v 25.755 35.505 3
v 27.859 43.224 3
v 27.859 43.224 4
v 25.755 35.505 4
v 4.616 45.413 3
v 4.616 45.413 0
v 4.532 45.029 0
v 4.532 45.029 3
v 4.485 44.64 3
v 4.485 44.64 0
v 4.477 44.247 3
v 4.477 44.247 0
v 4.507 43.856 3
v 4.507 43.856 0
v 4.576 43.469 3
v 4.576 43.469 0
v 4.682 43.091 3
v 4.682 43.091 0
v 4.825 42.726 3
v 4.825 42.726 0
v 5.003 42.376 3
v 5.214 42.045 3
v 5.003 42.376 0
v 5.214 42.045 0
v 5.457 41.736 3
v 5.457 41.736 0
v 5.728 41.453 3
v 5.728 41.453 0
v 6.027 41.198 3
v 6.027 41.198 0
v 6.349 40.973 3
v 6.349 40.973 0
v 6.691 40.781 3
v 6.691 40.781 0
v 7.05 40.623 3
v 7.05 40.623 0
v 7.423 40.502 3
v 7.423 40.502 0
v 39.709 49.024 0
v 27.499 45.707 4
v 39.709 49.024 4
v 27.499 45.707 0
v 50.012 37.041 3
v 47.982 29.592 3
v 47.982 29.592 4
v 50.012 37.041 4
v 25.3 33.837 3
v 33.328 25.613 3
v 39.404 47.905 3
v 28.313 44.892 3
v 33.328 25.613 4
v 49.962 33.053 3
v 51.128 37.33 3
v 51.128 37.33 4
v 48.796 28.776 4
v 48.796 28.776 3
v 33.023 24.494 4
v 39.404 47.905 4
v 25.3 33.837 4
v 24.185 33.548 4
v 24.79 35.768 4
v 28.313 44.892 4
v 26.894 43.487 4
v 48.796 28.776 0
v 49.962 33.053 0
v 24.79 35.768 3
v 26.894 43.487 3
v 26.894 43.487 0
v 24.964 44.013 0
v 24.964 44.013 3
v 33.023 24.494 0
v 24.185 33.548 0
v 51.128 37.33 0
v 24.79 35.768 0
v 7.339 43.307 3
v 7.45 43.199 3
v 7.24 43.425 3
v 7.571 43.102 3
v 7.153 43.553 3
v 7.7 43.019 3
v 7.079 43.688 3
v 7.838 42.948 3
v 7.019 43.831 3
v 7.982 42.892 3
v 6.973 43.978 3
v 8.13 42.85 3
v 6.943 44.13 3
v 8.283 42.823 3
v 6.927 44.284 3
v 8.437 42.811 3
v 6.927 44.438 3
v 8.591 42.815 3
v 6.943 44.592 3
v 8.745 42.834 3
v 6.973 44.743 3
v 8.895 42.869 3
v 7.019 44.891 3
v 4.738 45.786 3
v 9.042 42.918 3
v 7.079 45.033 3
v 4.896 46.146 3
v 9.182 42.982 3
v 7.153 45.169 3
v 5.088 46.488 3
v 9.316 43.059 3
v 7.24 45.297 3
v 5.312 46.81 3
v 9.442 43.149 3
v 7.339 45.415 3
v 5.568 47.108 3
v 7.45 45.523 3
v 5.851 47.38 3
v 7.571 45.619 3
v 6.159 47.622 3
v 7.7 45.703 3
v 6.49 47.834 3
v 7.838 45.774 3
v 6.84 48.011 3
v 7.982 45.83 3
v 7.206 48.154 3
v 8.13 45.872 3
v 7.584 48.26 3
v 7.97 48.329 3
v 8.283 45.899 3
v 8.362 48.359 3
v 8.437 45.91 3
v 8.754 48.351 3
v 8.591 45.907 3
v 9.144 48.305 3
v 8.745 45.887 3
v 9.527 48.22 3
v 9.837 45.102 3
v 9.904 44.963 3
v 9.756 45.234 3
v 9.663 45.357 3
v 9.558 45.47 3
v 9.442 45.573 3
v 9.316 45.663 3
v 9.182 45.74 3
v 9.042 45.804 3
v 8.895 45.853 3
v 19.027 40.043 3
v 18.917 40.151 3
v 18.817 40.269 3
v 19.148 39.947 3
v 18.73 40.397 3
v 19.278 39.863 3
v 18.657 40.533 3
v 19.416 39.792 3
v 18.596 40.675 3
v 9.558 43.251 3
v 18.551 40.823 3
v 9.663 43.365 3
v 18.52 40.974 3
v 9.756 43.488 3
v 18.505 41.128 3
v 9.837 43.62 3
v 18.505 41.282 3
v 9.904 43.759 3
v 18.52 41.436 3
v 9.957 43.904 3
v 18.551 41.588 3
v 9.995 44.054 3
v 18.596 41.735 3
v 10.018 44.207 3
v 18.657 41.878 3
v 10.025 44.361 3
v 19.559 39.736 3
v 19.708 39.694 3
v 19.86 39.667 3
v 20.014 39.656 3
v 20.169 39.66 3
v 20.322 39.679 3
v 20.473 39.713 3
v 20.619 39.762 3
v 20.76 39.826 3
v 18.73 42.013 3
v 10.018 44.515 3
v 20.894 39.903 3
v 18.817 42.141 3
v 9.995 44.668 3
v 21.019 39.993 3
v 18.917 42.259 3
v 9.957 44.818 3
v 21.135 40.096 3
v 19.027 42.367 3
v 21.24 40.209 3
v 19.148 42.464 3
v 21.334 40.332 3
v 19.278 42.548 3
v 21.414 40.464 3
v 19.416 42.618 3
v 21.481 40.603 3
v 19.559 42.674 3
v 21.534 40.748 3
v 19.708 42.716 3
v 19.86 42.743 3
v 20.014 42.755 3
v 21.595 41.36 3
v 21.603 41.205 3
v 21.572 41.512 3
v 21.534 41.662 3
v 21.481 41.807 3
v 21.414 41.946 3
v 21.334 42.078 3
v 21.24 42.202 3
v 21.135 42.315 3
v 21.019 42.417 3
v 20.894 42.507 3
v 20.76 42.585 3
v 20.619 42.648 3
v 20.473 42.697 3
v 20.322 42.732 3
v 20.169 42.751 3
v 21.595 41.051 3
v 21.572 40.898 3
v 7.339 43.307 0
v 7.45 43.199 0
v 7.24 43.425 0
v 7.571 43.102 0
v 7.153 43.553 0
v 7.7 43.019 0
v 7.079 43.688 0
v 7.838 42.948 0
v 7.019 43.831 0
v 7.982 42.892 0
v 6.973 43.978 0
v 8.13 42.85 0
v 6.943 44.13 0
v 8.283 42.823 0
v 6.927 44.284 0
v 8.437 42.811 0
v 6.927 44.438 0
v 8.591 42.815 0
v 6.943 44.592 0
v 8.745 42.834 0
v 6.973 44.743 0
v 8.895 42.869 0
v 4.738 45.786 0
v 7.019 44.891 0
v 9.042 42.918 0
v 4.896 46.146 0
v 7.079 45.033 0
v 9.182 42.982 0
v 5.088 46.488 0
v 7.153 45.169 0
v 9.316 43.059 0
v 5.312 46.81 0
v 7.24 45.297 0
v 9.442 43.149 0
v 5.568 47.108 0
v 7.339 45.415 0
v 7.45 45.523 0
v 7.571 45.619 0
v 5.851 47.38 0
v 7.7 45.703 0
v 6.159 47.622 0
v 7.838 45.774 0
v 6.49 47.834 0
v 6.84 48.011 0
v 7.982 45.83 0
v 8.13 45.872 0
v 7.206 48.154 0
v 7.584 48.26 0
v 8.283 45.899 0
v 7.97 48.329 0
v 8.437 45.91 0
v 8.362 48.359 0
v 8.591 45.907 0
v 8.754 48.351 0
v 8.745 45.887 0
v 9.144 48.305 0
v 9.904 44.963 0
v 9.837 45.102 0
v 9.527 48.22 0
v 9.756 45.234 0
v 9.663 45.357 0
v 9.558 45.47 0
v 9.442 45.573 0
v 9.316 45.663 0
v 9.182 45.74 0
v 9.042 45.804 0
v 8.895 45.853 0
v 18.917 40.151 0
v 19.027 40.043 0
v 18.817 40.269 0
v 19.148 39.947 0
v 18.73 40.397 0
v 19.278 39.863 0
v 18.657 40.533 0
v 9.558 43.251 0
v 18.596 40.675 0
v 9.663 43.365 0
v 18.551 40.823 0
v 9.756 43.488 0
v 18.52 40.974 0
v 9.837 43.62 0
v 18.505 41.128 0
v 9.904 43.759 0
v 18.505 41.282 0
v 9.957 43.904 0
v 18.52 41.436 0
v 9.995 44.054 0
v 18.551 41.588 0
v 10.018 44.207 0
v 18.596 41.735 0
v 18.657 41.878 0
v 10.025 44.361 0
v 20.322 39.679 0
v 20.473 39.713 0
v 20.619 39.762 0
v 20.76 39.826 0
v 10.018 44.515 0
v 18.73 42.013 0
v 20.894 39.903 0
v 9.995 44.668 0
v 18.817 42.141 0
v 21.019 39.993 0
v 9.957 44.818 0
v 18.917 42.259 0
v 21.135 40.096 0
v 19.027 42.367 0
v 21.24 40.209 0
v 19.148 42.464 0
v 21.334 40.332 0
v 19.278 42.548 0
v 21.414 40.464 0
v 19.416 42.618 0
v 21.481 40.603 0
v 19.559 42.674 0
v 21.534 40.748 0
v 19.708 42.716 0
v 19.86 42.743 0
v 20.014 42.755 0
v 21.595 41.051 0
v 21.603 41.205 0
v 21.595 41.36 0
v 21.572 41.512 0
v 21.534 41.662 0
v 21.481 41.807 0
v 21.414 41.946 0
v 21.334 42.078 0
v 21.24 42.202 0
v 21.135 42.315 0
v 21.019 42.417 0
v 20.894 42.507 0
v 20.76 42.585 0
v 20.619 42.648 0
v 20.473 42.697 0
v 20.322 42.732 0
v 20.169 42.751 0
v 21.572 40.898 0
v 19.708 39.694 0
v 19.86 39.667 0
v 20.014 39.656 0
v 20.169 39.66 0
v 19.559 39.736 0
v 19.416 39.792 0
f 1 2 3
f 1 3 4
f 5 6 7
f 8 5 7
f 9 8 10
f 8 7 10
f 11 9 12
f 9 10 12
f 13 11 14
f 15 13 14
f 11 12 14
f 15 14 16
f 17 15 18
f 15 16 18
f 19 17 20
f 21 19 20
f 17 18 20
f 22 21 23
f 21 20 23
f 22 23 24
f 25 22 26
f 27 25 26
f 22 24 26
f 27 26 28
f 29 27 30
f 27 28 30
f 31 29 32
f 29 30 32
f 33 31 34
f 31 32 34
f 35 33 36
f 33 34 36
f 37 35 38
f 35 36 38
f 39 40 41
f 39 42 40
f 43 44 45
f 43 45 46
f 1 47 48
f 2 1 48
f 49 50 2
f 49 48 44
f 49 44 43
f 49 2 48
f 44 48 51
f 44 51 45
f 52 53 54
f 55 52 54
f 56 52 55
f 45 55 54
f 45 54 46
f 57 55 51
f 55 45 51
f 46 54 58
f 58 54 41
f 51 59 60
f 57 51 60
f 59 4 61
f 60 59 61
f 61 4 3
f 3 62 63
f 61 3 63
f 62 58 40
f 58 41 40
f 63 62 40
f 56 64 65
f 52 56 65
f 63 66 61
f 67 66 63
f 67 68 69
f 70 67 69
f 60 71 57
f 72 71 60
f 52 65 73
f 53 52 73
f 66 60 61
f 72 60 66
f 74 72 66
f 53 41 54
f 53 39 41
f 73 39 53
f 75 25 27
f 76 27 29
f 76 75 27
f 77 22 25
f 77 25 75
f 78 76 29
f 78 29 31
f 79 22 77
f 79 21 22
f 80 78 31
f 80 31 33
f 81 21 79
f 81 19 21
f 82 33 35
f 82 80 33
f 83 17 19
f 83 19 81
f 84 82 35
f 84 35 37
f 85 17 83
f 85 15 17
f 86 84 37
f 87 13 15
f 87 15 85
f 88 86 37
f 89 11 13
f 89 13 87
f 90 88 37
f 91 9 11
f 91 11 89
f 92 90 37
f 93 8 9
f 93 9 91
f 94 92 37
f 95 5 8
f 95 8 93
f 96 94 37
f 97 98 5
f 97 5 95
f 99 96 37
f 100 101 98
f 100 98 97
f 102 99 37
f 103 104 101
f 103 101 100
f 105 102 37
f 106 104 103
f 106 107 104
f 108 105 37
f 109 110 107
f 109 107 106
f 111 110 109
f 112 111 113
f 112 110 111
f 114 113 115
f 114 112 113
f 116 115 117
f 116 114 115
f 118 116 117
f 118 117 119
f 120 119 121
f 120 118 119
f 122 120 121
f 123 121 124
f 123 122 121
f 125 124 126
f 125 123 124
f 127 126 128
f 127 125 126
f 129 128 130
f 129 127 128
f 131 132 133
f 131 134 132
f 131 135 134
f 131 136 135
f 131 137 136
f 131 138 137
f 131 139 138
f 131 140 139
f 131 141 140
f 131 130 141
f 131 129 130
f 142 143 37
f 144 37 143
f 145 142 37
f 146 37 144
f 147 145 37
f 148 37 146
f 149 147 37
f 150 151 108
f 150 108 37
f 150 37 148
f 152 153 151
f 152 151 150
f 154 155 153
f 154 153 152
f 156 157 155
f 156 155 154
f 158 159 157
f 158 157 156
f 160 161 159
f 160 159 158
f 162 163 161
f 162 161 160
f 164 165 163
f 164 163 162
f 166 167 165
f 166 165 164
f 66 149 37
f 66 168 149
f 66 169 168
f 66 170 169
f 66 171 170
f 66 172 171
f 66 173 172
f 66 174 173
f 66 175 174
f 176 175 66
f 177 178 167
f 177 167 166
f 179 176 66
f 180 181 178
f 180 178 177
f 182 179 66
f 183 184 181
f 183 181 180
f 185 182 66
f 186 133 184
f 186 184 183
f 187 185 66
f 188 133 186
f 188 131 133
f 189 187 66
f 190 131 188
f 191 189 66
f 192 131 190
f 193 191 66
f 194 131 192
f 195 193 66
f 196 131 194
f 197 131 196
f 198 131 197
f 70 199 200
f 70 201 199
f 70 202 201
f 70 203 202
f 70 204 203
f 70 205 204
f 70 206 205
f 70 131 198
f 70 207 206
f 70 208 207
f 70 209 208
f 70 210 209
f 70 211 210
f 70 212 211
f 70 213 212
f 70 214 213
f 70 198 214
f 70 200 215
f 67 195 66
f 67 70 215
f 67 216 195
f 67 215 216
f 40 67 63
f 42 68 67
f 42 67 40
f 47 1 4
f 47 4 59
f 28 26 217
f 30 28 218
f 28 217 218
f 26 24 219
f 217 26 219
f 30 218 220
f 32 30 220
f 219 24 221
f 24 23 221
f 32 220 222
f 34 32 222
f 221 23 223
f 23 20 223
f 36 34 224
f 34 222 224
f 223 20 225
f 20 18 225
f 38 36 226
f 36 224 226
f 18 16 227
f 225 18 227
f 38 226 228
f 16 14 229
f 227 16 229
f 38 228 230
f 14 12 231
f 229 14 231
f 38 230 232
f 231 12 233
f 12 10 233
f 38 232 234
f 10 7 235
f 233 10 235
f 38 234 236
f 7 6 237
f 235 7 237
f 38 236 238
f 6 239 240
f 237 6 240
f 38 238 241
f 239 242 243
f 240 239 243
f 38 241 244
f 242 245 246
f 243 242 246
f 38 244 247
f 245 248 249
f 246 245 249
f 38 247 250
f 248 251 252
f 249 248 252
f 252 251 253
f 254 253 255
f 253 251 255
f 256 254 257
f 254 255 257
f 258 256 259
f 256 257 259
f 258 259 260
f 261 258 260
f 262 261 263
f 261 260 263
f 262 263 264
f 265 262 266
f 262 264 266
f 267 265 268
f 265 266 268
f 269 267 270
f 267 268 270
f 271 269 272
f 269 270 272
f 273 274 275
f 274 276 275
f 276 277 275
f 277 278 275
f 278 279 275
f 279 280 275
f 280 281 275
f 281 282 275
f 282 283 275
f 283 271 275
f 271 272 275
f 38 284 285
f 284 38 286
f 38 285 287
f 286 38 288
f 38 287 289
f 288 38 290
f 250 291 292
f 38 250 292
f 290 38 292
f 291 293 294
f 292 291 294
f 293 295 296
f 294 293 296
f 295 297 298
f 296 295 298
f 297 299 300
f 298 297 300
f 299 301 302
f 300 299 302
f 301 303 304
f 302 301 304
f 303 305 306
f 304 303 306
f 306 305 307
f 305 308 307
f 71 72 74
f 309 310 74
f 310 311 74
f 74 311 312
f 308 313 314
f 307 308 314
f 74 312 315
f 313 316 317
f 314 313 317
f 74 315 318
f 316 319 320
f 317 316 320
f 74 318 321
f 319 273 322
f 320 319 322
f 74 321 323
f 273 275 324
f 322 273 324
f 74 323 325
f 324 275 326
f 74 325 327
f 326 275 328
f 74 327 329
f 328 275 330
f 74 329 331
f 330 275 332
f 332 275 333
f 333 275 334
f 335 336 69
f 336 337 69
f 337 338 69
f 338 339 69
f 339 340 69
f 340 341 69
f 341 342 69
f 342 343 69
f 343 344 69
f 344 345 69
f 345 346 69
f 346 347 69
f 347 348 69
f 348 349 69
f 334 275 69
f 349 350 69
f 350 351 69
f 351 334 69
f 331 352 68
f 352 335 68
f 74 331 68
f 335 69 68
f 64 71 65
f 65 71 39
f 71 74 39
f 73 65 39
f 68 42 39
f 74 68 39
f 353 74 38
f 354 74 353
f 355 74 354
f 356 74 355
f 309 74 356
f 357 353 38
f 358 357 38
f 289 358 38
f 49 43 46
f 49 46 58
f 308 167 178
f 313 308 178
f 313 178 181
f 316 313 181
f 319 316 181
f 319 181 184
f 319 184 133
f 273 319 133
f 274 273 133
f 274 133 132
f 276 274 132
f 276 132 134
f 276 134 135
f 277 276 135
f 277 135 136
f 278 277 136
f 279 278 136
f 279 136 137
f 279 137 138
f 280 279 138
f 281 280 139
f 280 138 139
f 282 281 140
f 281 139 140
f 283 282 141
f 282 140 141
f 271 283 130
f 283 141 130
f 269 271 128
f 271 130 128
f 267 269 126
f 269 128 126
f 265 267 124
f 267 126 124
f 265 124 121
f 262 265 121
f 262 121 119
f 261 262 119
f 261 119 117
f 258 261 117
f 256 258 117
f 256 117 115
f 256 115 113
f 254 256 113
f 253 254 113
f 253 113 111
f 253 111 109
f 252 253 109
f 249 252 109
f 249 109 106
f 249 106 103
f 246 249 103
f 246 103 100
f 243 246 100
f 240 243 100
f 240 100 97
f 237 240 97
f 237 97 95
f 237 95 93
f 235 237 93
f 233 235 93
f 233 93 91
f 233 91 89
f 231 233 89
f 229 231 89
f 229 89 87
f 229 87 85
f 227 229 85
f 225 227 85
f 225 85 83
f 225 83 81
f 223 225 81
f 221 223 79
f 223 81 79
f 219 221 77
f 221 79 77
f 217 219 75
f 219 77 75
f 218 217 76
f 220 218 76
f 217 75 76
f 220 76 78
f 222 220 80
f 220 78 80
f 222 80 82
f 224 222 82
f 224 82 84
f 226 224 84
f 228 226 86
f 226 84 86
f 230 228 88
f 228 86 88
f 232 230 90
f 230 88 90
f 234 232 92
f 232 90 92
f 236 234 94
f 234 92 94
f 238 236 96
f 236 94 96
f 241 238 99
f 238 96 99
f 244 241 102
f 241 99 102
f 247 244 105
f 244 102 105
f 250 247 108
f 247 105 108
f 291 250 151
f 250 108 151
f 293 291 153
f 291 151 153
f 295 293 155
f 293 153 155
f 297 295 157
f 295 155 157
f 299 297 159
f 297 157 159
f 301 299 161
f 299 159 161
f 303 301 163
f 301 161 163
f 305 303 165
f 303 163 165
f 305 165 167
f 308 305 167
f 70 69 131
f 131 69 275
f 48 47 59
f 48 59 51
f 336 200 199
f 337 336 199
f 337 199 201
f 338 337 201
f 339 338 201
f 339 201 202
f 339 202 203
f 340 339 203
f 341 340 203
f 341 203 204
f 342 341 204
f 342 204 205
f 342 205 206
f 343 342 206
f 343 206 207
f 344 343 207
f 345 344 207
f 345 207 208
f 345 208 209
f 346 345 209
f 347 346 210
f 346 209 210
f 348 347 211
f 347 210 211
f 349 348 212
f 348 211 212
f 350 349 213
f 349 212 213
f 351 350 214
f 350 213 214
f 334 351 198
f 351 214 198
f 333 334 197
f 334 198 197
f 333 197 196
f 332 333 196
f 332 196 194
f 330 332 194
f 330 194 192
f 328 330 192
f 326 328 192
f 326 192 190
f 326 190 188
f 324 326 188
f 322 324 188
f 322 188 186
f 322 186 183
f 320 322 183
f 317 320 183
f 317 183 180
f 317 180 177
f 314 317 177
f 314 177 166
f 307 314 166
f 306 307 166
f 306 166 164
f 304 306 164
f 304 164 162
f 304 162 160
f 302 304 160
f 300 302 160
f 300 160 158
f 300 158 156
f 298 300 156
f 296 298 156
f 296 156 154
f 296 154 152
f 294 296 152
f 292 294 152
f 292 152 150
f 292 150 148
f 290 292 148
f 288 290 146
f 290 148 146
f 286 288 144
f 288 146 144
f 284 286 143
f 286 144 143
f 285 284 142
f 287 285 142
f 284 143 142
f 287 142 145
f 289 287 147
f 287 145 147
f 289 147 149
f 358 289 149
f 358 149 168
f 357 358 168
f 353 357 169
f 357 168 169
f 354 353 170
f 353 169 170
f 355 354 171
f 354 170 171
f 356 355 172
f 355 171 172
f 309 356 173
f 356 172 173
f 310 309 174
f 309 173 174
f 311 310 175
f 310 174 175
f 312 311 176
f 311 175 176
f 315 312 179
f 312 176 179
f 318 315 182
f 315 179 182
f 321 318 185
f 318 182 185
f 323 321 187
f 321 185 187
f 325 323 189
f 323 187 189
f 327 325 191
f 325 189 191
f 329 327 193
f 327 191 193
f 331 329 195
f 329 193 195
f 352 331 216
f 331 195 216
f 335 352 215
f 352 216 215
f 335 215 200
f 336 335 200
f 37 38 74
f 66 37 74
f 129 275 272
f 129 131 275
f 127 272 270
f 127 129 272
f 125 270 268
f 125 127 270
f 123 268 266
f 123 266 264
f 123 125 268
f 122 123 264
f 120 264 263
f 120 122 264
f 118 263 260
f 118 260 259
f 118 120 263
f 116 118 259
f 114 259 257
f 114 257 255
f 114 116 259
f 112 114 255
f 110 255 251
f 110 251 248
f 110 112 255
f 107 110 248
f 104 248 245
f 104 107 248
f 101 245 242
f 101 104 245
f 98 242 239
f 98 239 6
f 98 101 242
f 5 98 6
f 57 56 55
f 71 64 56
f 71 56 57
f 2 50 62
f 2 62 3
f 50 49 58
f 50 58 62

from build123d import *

# Parameters (mm, degrees)
BOSS_EXTRUDE1_DEPTH = 3
FILLET1_R           = 4
BOSS_EXTRUDE2_DEPTH = 1
CUT_EXTRUDE1_REACH  = 72.897
SKETCH5_R           = 1.55


with BuildPart() as part:
    # Sketch1 → Boss-Extrude1 (new body)
    with BuildSketch(Plane.XY):
        Polygon((49.961918802, 33.053079846), (25.841829778, 39.627371101), (24.789943177, 35.768156857), (24.184782156, 33.547911794), (33.022732651, 24.493907566), (48.796245804, 28.776400372), align=None)
        Polygon((27.4988774, 45.706830407), (26.893716379, 43.486585345), (25.841829778, 39.627371101), (49.961918802, 33.053079846), (51.127591799, 37.329759319), (39.708758261, 49.023933188), align=None)
        with BuildLine():
            Line((24.964109257, 44.012528645), (5.668038039, 49.271961649))
            Line((5.668038039, 49.271961649), (4.616151438, 45.412747405))
            ThreePointArc((4.616151438, 45.412747405), (5.002692971, 42.375780391), (7.423479081, 40.501646561))
            Line((7.423479081, 40.501646561), (24.789943177, 35.768156857))
            Line((24.789943177, 35.768156857), (25.841829778, 39.627371101))
            Line((25.841829778, 39.627371101), (26.893716379, 43.486585345))
            Line((26.893716379, 43.486585345), (24.964109257, 44.012528645))
        make_face()
    extrude(amount=BOSS_EXTRUDE1_DEPTH)

    # Fillet1
    fillet1_edges = [part.edges().sort_by_distance(p)[0] for p in [
        (5.668038039, 49.271961649, 1.5),
    ]]
    fillet(fillet1_edges, radius=FILLET1_R - 0.0001)  # a hair under: the kernel refuses the full size

    # Sketch2 → Boss-Extrude2 (add)
    with BuildSketch(Plane.XY.offset(3)):
        Polygon((48.796245804, 28.776400372), (33.022732651, 24.493907566), (24.184782156, 33.547911794), (24.789943177, 35.768156857), (26.893716379, 43.486585345), (27.4988774, 45.706830407), (39.708758261, 49.023933188), (51.127591799, 37.329759319), align=None)
        Polygon((27.85851994, 43.223613694), (25.754746738, 35.505185207), (25.300052744, 33.836981106), (33.327840747, 25.612944712), (47.98193766, 29.591517145), (50.012292821, 37.040585847), (39.40383219, 47.904846429), (28.313213935, 44.891817795), align=None, mode=Mode.SUBTRACT)
    extrude(amount=BOSS_EXTRUDE2_DEPTH)

    # Sketch5 → Cut-Extrude1 (cut, up to next)
    with BuildSketch(Plane.XY.offset(3), mode=Mode.PRIVATE) as cut_extrude1_sk1:
        with Locations((8.475365681, 44.360860805)):
            Circle(SKETCH5_R)
    cut_extrude1_tool1 = extrude(cut_extrude1_sk1.sketch, amount=-CUT_EXTRUDE1_REACH, mode=Mode.PRIVATE) & part.part
    # Sketch5 → Cut-Extrude1 (cut, up to next)
    with BuildSketch(Plane.XY.offset(3), mode=Mode.PRIVATE) as cut_extrude1_sk2:
        with Locations((20.053008413, 41.205201002)):
            Circle(SKETCH5_R)
    cut_extrude1_tool2 = extrude(cut_extrude1_sk2.sketch, amount=-CUT_EXTRUDE1_REACH, mode=Mode.PRIVATE) & part.part
    add(cut_extrude1_tool1.solids().sort_by_distance((8.475366, 44.360861, 3))[0], mode=Mode.SUBTRACT)
    add(cut_extrude1_tool2.solids().sort_by_distance((20.053008, 41.205201, 3))[0], mode=Mode.SUBTRACT)


solid = part.part
